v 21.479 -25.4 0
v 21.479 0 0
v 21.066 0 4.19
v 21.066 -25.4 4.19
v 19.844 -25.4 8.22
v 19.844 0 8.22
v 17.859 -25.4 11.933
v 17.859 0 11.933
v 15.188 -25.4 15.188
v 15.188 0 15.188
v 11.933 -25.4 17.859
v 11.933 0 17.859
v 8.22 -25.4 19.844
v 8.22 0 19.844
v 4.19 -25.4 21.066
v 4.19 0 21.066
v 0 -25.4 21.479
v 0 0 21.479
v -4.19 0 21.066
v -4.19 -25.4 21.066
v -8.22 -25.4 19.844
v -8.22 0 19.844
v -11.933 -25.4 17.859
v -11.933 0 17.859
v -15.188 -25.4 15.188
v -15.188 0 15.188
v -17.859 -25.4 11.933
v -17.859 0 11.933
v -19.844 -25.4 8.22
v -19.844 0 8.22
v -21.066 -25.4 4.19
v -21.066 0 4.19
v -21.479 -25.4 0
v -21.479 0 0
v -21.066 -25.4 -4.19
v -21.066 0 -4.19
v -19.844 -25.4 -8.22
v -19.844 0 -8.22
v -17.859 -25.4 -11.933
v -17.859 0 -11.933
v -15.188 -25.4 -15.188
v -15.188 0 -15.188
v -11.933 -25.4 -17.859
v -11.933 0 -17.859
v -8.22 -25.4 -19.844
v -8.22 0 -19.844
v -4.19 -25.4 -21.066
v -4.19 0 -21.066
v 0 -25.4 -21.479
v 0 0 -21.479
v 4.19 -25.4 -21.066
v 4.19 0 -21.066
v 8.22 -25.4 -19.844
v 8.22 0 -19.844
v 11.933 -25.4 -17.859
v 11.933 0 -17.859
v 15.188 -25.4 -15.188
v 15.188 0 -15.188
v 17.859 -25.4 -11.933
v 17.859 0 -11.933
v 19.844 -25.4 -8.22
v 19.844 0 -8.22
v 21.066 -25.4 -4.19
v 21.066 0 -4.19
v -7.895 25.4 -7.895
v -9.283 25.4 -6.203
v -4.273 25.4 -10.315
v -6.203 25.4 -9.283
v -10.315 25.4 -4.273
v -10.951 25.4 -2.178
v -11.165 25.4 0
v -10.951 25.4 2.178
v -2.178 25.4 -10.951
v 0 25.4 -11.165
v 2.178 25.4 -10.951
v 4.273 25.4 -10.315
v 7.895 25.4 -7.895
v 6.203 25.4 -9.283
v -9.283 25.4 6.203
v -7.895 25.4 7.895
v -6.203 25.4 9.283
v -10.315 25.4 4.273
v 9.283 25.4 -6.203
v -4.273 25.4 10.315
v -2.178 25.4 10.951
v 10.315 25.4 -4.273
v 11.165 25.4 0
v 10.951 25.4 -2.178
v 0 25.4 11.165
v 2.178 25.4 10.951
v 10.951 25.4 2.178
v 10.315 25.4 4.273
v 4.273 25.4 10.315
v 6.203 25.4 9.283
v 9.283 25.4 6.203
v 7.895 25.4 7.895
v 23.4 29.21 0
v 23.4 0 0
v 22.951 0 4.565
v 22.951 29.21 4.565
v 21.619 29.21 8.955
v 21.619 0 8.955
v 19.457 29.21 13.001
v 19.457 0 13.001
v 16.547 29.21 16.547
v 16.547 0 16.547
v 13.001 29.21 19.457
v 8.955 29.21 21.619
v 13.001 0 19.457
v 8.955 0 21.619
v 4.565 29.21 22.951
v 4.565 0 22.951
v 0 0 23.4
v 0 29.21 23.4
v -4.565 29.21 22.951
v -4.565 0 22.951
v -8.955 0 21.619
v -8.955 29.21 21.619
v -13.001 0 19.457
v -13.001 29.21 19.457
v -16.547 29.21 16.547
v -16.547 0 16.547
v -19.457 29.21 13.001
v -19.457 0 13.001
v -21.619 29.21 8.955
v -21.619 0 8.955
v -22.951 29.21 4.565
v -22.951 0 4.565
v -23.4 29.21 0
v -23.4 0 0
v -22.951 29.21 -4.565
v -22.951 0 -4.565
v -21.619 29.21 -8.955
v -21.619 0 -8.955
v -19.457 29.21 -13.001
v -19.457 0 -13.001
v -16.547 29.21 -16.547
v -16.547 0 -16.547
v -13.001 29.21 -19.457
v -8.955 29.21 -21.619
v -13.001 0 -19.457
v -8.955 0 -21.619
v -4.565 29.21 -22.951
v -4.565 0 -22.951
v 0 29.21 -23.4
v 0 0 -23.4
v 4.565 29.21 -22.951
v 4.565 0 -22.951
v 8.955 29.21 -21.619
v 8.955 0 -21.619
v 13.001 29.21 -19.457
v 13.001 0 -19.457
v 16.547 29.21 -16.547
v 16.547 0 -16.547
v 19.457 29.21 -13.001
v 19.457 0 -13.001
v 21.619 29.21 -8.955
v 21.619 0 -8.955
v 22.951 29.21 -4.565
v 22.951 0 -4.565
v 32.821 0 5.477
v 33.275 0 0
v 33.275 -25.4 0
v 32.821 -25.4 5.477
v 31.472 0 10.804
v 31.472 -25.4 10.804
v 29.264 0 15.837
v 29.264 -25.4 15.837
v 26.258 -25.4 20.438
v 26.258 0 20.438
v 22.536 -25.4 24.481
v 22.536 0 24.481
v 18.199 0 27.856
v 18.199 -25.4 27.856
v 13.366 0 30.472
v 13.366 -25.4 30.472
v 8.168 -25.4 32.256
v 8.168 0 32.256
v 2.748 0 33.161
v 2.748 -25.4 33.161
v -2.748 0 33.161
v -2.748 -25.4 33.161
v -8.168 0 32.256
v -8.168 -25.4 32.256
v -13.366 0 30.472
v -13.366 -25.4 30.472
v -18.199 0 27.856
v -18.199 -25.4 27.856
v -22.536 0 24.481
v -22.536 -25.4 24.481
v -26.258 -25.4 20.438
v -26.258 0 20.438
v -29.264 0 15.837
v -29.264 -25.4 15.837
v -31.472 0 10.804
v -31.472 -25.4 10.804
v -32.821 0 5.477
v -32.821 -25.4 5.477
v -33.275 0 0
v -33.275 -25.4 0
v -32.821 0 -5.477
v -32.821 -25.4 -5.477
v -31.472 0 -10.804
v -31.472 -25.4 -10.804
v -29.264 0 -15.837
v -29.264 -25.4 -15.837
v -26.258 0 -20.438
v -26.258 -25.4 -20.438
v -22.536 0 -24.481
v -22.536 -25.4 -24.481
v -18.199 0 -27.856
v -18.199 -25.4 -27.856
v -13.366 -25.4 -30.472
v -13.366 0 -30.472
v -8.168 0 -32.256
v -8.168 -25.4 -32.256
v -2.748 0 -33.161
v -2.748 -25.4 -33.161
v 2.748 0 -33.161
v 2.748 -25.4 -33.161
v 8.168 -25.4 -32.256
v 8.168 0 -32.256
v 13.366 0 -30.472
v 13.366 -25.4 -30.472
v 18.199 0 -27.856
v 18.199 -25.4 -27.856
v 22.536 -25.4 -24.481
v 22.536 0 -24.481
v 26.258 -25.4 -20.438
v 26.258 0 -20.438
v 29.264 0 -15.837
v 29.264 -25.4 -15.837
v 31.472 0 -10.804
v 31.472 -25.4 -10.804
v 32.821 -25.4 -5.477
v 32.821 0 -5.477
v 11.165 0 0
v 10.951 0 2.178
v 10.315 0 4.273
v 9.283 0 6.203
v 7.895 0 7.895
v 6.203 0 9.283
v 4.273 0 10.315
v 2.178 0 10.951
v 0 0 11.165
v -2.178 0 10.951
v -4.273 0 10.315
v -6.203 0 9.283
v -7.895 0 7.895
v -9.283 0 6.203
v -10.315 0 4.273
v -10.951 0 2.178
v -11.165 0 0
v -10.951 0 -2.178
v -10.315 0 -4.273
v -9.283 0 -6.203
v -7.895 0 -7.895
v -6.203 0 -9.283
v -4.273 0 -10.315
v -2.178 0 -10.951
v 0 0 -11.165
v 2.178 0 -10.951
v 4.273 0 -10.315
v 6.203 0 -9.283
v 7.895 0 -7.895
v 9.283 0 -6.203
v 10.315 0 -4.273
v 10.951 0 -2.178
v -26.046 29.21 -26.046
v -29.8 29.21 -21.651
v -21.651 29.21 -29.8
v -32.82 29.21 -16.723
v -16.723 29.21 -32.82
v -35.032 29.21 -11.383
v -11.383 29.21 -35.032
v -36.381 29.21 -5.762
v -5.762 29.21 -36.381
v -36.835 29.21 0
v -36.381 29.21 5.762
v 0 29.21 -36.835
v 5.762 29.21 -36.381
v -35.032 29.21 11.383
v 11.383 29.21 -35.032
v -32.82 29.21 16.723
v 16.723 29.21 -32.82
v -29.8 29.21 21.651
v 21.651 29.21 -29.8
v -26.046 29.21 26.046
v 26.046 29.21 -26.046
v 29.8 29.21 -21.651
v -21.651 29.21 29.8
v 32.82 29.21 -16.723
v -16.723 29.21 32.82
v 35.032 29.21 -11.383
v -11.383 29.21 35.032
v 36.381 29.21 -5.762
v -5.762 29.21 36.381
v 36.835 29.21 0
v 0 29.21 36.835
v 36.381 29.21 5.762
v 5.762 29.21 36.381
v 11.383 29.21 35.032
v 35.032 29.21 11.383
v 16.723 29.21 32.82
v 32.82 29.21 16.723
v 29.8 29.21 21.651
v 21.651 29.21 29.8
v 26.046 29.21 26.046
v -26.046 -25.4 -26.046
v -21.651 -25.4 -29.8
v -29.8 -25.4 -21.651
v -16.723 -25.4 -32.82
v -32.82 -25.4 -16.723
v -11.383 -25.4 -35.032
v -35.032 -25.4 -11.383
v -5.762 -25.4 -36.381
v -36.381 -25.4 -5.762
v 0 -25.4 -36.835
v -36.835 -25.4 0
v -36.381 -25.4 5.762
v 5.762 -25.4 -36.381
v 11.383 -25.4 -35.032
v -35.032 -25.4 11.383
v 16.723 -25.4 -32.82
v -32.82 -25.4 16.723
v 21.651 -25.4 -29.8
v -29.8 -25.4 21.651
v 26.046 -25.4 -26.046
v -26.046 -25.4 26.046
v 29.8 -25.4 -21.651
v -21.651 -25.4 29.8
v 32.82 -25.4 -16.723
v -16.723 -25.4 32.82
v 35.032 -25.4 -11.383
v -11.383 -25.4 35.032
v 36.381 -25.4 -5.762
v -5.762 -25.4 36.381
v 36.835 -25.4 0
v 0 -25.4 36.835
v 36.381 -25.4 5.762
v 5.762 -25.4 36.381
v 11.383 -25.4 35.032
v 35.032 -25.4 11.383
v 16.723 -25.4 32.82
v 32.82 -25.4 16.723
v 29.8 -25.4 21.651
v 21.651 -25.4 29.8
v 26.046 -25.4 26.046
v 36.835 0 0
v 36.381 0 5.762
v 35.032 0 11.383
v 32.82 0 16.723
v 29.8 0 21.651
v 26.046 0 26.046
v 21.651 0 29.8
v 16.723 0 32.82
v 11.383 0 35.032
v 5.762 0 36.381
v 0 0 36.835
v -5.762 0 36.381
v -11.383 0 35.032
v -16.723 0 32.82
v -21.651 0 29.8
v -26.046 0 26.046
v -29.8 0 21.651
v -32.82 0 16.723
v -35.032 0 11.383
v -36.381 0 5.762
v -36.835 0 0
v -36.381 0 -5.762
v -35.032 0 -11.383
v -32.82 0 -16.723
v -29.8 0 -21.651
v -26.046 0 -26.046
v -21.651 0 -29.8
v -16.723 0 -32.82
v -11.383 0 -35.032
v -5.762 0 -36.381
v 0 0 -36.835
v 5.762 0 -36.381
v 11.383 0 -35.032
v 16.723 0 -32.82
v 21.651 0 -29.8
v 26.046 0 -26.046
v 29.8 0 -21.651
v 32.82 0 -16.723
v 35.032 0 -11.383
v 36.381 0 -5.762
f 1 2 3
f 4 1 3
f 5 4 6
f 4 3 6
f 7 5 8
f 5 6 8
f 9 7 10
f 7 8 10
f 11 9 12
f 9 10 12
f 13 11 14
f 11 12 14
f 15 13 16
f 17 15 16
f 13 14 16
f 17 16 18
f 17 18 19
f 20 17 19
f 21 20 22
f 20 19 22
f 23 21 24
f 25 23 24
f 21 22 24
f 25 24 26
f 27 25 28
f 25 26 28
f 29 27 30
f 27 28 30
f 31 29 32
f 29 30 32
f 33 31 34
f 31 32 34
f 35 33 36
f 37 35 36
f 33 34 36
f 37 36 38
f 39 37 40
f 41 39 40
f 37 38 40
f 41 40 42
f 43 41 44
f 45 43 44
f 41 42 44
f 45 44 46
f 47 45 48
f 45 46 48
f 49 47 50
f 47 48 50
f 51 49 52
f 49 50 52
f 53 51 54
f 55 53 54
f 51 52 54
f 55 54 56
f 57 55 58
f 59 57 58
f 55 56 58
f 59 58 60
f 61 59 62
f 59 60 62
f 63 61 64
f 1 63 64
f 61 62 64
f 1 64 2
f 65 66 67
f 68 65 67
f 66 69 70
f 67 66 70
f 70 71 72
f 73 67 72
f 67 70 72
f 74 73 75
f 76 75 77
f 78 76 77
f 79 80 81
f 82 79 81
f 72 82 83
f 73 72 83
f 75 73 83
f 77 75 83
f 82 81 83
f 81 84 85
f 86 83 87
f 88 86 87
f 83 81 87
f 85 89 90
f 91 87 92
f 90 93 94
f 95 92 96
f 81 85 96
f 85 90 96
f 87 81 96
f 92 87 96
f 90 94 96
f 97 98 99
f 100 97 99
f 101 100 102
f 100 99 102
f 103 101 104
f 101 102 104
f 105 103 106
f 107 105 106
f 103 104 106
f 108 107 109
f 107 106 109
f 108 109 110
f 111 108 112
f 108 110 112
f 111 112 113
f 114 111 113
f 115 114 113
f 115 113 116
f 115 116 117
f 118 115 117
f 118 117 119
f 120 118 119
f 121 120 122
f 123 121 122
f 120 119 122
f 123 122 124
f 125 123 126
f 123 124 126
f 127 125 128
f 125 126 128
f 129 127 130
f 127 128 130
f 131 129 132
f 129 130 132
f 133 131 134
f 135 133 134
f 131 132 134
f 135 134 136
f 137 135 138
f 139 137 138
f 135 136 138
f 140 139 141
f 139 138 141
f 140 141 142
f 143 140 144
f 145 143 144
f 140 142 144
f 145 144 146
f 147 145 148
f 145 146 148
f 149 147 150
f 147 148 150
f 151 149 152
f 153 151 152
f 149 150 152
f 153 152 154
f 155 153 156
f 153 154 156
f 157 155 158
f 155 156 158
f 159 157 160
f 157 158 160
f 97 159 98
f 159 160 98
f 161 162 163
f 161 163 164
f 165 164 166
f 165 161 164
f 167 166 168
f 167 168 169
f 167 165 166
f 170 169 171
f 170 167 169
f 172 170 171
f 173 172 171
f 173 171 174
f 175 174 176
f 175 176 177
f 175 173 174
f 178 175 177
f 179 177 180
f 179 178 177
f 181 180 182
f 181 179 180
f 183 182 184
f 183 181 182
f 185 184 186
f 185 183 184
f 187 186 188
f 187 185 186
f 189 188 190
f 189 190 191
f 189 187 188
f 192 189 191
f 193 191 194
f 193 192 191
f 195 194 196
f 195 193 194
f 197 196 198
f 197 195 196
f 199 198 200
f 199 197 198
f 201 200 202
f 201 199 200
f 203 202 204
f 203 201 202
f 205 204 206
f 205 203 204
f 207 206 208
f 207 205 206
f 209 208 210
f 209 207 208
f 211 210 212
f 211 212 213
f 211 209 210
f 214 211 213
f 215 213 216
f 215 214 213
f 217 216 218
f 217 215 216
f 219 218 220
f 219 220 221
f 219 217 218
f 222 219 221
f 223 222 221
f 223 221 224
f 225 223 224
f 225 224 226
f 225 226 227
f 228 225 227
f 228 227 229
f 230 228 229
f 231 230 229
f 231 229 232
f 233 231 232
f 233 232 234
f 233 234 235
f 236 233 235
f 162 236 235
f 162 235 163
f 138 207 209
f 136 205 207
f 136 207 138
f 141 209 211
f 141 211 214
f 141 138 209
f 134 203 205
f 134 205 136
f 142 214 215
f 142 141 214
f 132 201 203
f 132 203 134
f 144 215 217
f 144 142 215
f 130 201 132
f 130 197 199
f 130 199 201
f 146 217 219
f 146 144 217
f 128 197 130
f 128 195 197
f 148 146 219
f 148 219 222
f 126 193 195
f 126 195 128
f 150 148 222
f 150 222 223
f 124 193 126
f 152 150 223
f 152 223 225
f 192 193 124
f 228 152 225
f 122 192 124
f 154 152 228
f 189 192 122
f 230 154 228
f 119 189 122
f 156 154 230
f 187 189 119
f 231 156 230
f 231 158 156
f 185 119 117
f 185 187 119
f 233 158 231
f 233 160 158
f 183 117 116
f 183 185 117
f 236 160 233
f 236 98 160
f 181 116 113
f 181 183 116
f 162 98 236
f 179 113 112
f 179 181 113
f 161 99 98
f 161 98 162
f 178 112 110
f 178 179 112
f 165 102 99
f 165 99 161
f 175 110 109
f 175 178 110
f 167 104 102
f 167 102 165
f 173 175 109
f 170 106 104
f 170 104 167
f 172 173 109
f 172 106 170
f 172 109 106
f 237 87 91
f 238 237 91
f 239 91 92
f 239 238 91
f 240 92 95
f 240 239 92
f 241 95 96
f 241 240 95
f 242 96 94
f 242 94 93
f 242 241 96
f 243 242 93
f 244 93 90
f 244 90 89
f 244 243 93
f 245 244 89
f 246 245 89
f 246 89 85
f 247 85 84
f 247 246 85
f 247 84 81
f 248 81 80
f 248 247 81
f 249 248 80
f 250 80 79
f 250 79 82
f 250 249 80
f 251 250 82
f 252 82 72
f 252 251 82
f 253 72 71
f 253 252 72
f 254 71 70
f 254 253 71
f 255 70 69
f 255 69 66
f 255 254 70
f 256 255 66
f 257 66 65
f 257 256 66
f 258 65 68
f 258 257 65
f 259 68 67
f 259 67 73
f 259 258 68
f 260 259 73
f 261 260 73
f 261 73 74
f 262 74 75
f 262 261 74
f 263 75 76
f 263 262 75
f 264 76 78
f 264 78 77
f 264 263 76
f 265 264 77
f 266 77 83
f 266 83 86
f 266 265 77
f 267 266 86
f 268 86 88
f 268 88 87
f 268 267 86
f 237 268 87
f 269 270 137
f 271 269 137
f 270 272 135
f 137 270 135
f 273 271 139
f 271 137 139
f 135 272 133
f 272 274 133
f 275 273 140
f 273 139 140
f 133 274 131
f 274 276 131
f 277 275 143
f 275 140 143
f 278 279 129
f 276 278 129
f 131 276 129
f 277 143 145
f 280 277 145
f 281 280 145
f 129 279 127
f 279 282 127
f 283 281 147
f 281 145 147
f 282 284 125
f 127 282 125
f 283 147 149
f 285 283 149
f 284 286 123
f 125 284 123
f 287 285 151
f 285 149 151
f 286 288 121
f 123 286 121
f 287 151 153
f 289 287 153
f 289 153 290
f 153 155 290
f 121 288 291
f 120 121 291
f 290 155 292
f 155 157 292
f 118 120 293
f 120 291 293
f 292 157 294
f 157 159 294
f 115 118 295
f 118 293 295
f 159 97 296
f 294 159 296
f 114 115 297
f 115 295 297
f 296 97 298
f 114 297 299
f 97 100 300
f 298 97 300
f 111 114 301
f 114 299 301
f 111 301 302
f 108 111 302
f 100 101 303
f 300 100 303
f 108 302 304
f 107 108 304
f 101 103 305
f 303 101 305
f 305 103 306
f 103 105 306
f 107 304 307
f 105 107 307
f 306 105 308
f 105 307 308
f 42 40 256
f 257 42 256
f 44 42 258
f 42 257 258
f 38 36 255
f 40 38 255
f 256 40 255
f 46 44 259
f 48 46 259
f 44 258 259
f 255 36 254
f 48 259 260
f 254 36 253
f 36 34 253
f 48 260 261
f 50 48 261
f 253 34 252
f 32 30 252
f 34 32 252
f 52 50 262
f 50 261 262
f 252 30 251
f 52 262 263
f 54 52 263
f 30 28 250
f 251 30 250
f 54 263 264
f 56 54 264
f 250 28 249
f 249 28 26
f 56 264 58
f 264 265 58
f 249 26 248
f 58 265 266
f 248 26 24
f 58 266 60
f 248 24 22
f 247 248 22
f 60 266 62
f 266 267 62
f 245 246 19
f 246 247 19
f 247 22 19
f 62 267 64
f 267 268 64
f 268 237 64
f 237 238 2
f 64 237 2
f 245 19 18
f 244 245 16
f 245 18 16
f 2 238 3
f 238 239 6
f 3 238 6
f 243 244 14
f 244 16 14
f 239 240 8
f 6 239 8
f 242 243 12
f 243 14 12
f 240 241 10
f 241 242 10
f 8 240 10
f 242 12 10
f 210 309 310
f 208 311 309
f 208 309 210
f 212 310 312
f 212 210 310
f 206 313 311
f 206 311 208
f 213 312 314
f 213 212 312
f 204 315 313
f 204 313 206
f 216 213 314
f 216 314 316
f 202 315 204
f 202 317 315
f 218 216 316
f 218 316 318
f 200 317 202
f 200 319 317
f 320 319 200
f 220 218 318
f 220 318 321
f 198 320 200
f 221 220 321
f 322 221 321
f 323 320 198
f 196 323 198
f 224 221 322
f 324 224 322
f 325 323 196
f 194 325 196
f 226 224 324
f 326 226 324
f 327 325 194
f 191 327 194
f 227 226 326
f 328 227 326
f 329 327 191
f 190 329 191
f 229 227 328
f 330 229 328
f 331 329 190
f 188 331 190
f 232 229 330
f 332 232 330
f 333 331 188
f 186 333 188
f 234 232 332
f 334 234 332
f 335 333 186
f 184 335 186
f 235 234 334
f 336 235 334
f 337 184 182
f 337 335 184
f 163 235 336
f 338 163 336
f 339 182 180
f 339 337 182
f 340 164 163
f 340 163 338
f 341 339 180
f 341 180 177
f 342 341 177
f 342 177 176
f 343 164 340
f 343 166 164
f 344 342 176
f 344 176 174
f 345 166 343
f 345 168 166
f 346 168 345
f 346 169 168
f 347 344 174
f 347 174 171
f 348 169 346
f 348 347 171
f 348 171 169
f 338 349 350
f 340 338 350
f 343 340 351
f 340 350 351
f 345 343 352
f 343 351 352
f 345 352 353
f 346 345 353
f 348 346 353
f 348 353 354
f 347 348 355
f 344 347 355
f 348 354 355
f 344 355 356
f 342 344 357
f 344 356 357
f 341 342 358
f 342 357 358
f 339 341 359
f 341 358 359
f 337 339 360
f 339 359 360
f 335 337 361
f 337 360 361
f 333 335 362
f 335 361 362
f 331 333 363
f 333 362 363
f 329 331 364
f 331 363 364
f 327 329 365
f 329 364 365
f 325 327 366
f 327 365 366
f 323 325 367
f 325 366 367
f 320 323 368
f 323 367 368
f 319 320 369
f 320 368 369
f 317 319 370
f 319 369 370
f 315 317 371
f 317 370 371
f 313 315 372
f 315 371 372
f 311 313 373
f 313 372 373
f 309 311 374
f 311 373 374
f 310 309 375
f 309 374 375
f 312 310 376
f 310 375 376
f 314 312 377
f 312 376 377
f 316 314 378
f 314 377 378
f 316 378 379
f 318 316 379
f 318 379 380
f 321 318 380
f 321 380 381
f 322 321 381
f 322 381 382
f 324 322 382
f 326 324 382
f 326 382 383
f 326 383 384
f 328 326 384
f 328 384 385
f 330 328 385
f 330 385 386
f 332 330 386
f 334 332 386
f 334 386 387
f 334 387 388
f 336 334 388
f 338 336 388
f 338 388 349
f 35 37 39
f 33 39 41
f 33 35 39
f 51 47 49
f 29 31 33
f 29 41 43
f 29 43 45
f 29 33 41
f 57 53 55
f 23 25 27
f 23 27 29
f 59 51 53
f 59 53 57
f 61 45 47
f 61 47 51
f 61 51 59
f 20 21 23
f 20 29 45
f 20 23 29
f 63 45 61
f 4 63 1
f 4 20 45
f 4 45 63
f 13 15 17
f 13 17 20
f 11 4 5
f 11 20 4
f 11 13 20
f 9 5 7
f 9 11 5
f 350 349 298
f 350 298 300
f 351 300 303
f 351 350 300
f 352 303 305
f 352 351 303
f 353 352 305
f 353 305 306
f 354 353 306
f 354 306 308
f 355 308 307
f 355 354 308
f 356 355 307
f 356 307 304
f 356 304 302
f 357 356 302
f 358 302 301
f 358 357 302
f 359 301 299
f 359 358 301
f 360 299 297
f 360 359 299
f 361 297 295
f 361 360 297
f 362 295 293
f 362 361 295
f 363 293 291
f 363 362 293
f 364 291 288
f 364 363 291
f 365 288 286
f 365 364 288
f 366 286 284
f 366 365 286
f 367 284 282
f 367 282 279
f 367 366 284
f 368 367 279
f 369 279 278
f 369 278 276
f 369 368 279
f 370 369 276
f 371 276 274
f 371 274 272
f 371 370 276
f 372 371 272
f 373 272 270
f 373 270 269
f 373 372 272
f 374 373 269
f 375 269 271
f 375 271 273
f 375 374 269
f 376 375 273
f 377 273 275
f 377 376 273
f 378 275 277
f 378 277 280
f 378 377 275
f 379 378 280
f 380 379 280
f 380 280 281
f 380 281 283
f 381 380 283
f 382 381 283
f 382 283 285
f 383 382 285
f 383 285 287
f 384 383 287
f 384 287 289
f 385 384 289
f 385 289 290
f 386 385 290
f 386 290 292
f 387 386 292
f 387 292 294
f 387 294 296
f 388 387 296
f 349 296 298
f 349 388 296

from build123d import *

# Parameters (mm, degrees)
F0_R      = 11.1651505915
F1_DEPTH  = 25.4
F0_R_2    = 21.478588928
F1_FACE_R = 11.1651505915
F2_DEPTH  = 25.4
F3_R      = 36.8347445055
F3_R_2    = 23.4004283817
F4_DEPTH  = 29.21
F5_R      = 36.8347445055
F5_R_2    = 33.2745729173
F6_DEPTH  = 25.4


with BuildPart() as f1:
    # F0 (on Front) → F1 (new body)
    with BuildSketch(Plane.XZ):
        Circle(F0_R)
    extrude(amount=-F1_DEPTH)

    # F0 (on Front) + F1_face (on face) → F2 (join)
    with BuildSketch(Plane.XZ):
        Circle(F0_R_2)
        Circle(F0_R, mode=Mode.SUBTRACT)
    with BuildSketch(Plane.XZ):
        Circle(F1_FACE_R)
    extrude(amount=F2_DEPTH)


with BuildPart() as f4:
    # F3 (on Front) → F4 (new body)
    with BuildSketch(Plane.XZ):
        Circle(F3_R)
        Circle(F3_R_2, mode=Mode.SUBTRACT)
    extrude(amount=-F4_DEPTH)

    # F5 (on face) → F6 (join)
    with BuildSketch(Plane.XZ):
        Circle(F5_R)
        Circle(F5_R_2, mode=Mode.SUBTRACT)
    extrude(amount=F6_DEPTH)


solid = Compound([f1.part, f4.part])
